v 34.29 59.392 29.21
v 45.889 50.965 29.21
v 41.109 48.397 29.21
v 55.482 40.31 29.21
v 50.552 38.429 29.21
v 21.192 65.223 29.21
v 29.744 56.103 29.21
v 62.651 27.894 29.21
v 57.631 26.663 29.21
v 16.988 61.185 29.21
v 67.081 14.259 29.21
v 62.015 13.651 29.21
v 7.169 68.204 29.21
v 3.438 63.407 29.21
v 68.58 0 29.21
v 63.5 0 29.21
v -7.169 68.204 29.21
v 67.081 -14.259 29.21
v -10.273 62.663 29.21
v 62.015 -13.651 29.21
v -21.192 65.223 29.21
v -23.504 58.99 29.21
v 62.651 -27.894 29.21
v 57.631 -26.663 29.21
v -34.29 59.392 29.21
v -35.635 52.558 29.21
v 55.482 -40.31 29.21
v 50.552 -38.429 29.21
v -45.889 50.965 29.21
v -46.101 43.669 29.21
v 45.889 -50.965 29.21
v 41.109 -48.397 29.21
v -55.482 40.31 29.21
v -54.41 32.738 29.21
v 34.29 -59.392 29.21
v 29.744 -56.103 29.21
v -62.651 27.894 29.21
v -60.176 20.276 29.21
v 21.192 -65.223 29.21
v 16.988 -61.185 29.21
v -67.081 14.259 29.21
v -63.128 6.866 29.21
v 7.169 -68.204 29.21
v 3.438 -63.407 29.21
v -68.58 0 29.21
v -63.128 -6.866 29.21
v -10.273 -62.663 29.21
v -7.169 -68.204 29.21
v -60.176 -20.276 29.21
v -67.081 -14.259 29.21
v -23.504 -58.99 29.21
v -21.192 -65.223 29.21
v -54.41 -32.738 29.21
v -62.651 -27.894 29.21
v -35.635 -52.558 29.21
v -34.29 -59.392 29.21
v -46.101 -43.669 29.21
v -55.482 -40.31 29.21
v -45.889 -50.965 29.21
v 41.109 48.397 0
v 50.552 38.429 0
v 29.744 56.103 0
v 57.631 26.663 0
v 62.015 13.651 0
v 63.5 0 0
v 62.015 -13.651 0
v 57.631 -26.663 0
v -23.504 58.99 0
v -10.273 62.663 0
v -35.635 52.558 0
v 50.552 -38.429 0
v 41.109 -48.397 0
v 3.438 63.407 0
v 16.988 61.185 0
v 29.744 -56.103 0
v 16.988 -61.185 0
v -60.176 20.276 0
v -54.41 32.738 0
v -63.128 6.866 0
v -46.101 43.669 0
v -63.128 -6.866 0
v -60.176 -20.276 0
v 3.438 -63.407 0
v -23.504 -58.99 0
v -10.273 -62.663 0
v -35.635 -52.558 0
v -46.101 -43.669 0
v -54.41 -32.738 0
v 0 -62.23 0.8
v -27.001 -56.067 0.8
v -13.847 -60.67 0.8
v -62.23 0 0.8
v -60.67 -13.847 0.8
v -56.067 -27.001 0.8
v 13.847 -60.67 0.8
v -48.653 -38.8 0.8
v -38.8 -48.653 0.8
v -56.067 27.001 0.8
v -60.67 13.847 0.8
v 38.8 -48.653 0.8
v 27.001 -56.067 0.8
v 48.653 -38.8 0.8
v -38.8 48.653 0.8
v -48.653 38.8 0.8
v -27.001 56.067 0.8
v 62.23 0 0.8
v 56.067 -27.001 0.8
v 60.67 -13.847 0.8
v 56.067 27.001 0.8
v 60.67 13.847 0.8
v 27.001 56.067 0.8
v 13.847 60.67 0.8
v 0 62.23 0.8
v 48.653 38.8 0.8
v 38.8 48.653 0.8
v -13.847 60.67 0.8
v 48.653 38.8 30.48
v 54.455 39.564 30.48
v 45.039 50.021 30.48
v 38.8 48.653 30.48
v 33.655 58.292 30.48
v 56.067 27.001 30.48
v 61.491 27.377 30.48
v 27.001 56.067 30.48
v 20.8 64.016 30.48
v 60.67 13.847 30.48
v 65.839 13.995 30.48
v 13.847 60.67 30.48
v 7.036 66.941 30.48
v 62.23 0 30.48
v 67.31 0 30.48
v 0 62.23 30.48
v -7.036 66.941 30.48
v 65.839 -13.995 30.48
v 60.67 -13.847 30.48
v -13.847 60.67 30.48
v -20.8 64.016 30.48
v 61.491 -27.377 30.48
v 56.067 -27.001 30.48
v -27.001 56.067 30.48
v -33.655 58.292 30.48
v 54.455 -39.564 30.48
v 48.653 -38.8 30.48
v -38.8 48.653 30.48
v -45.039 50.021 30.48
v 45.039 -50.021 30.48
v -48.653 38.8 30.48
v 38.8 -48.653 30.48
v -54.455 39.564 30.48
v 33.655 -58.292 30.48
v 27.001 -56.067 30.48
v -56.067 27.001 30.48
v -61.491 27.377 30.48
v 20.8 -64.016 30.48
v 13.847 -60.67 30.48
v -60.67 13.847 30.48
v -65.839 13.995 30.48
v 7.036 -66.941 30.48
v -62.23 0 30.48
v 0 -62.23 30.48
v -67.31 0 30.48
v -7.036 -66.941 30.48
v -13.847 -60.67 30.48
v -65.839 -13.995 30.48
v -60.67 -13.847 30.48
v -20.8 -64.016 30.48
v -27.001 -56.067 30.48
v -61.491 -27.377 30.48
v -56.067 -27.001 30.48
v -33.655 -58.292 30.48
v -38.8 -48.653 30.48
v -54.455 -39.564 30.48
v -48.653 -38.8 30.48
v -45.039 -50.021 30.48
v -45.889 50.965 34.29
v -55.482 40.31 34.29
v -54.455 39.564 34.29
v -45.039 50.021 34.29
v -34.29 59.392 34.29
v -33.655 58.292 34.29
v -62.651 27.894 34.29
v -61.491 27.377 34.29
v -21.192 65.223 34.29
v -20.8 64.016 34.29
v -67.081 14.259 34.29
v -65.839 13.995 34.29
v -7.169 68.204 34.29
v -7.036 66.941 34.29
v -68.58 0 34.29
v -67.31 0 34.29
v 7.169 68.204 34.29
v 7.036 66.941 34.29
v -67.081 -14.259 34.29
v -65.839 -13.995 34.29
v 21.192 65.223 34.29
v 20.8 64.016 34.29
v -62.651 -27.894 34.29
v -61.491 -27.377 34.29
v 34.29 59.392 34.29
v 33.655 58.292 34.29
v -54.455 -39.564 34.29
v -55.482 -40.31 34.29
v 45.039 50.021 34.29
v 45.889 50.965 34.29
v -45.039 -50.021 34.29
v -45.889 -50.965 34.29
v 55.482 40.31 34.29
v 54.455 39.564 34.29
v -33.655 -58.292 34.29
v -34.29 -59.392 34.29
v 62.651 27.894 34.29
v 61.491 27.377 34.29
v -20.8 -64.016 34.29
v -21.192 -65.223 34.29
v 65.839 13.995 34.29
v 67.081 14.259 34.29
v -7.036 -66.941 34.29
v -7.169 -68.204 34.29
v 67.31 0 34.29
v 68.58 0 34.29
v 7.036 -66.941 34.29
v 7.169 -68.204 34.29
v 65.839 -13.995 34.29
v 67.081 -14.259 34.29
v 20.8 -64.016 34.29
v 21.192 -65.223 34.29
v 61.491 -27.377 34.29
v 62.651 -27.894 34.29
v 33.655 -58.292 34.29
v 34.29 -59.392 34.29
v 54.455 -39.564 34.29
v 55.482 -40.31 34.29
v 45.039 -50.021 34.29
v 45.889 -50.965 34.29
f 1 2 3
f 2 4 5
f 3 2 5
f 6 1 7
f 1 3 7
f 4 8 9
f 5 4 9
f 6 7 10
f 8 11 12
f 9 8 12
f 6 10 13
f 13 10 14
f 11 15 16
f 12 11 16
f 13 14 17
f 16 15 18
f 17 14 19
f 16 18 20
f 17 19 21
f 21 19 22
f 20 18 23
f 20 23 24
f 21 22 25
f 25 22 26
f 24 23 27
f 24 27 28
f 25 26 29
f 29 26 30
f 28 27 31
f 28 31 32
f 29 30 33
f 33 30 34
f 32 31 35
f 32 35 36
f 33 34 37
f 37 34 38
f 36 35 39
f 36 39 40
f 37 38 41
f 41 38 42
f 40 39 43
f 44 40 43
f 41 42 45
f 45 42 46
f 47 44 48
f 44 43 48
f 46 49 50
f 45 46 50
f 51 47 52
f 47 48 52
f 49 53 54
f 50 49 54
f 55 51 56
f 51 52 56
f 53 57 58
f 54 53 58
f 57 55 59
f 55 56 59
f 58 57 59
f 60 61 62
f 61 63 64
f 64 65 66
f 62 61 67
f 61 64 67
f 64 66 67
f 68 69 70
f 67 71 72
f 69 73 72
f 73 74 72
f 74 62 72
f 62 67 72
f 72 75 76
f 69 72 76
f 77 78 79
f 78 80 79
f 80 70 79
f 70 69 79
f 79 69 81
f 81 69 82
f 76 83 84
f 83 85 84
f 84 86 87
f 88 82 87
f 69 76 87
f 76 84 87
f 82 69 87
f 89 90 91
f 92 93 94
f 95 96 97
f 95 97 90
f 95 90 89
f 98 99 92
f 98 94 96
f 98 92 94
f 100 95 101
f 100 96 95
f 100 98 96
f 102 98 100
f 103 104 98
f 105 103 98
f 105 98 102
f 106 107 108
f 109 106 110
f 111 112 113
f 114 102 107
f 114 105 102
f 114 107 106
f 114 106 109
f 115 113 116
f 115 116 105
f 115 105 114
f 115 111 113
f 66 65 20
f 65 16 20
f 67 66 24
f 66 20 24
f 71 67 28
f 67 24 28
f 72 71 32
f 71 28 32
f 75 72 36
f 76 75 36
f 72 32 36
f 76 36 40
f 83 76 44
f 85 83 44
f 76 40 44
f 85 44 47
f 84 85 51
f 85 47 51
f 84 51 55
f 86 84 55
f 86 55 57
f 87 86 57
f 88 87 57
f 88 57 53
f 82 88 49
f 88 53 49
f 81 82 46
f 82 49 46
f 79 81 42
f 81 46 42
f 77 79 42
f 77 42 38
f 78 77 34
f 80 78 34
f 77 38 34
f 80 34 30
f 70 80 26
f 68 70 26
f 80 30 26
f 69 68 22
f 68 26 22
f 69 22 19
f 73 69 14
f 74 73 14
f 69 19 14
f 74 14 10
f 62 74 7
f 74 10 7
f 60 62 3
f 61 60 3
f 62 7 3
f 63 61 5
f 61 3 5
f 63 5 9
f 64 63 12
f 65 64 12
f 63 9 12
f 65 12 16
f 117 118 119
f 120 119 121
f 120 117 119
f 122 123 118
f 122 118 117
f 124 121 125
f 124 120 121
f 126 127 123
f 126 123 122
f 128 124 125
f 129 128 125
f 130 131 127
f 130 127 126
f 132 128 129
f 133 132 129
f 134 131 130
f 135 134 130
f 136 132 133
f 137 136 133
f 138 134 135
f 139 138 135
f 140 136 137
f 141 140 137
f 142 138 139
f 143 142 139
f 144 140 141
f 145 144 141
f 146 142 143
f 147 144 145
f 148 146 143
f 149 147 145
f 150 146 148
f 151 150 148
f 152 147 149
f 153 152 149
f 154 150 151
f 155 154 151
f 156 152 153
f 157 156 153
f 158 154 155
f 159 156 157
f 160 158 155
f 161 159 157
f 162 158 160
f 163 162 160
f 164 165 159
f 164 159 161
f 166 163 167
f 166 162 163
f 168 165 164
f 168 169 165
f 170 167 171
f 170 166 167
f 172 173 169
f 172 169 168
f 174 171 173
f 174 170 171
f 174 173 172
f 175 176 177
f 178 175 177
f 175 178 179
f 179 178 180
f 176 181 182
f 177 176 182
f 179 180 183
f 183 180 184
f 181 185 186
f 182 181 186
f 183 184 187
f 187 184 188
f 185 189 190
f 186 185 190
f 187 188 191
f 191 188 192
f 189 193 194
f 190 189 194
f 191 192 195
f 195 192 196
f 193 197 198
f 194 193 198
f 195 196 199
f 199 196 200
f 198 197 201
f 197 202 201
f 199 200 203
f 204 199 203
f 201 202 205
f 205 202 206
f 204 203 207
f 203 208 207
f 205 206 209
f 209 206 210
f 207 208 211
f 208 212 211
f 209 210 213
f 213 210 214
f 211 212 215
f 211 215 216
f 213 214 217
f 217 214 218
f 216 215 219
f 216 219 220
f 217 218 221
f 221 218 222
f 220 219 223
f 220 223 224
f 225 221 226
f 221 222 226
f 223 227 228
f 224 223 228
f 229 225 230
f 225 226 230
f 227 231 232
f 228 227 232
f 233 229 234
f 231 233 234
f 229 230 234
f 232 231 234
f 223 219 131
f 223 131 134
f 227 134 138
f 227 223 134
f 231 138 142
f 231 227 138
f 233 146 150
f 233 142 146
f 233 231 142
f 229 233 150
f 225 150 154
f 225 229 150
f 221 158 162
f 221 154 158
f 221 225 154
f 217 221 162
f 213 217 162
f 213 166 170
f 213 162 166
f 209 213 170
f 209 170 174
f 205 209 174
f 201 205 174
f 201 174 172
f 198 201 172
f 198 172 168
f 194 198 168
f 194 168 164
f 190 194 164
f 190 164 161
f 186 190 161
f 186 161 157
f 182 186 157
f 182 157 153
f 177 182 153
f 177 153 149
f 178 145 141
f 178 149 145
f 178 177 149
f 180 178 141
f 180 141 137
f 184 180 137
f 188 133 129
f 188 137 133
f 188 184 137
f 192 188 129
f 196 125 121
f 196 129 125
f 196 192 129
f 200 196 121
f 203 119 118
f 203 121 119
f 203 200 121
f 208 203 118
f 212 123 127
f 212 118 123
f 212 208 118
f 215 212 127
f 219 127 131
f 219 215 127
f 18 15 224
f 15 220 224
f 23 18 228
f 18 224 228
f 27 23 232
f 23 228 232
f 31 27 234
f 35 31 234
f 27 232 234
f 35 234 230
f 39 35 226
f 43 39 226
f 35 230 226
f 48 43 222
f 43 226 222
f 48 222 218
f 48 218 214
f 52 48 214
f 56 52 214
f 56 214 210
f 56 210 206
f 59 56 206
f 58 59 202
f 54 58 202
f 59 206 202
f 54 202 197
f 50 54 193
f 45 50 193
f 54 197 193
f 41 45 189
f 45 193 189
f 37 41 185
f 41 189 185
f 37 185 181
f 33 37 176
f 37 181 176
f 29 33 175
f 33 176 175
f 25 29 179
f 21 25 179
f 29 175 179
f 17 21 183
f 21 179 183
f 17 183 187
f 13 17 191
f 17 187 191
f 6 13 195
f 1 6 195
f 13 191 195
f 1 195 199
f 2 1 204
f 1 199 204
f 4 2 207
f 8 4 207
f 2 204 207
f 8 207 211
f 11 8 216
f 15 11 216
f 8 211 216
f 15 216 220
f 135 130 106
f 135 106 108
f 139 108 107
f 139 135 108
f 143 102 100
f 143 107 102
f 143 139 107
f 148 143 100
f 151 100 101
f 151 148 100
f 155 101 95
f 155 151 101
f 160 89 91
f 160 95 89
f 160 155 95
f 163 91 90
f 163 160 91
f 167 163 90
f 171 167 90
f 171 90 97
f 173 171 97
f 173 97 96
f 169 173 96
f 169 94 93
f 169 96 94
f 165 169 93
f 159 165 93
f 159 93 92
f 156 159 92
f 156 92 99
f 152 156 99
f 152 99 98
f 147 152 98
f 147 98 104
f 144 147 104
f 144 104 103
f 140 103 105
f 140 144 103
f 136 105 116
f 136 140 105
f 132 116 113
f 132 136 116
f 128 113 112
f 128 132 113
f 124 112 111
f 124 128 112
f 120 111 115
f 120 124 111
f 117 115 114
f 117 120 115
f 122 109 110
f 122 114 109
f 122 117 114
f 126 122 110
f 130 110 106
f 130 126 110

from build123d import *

# Parameters (mm, degrees)
F2_T     = -1.27
F3_R     = 62.23
F4_DEPTH = 0.47


with BuildPart() as f1:
    # F0 (on Front) → F1 (revolve)
    with BuildSketch(Plane.XZ):
        Polygon((0, 34.29), (0, 0), (63.5, 0), (63.5, 29.21), (68.58, 29.21), (68.58, 34.29), align=None)
    revolve(axis=Axis((0, 0, -14.2717824864), (0, 0, -1)))

    # F2
    f2_openings = [f1.faces().sort_by_distance(p)[0] for p in [
        (0, 0, 34.29),
    ]]
    offset(amount=F2_T, openings=f2_openings, kind=Kind.INTERSECTION)

    # F3 (on face) → F4 (cut, through all)
    with BuildSketch(Plane.XY.offset(1.27)):
        Circle(F3_R)
    extrude(amount=-F4_DEPTH, mode=Mode.SUBTRACT)


solid = f1.part
